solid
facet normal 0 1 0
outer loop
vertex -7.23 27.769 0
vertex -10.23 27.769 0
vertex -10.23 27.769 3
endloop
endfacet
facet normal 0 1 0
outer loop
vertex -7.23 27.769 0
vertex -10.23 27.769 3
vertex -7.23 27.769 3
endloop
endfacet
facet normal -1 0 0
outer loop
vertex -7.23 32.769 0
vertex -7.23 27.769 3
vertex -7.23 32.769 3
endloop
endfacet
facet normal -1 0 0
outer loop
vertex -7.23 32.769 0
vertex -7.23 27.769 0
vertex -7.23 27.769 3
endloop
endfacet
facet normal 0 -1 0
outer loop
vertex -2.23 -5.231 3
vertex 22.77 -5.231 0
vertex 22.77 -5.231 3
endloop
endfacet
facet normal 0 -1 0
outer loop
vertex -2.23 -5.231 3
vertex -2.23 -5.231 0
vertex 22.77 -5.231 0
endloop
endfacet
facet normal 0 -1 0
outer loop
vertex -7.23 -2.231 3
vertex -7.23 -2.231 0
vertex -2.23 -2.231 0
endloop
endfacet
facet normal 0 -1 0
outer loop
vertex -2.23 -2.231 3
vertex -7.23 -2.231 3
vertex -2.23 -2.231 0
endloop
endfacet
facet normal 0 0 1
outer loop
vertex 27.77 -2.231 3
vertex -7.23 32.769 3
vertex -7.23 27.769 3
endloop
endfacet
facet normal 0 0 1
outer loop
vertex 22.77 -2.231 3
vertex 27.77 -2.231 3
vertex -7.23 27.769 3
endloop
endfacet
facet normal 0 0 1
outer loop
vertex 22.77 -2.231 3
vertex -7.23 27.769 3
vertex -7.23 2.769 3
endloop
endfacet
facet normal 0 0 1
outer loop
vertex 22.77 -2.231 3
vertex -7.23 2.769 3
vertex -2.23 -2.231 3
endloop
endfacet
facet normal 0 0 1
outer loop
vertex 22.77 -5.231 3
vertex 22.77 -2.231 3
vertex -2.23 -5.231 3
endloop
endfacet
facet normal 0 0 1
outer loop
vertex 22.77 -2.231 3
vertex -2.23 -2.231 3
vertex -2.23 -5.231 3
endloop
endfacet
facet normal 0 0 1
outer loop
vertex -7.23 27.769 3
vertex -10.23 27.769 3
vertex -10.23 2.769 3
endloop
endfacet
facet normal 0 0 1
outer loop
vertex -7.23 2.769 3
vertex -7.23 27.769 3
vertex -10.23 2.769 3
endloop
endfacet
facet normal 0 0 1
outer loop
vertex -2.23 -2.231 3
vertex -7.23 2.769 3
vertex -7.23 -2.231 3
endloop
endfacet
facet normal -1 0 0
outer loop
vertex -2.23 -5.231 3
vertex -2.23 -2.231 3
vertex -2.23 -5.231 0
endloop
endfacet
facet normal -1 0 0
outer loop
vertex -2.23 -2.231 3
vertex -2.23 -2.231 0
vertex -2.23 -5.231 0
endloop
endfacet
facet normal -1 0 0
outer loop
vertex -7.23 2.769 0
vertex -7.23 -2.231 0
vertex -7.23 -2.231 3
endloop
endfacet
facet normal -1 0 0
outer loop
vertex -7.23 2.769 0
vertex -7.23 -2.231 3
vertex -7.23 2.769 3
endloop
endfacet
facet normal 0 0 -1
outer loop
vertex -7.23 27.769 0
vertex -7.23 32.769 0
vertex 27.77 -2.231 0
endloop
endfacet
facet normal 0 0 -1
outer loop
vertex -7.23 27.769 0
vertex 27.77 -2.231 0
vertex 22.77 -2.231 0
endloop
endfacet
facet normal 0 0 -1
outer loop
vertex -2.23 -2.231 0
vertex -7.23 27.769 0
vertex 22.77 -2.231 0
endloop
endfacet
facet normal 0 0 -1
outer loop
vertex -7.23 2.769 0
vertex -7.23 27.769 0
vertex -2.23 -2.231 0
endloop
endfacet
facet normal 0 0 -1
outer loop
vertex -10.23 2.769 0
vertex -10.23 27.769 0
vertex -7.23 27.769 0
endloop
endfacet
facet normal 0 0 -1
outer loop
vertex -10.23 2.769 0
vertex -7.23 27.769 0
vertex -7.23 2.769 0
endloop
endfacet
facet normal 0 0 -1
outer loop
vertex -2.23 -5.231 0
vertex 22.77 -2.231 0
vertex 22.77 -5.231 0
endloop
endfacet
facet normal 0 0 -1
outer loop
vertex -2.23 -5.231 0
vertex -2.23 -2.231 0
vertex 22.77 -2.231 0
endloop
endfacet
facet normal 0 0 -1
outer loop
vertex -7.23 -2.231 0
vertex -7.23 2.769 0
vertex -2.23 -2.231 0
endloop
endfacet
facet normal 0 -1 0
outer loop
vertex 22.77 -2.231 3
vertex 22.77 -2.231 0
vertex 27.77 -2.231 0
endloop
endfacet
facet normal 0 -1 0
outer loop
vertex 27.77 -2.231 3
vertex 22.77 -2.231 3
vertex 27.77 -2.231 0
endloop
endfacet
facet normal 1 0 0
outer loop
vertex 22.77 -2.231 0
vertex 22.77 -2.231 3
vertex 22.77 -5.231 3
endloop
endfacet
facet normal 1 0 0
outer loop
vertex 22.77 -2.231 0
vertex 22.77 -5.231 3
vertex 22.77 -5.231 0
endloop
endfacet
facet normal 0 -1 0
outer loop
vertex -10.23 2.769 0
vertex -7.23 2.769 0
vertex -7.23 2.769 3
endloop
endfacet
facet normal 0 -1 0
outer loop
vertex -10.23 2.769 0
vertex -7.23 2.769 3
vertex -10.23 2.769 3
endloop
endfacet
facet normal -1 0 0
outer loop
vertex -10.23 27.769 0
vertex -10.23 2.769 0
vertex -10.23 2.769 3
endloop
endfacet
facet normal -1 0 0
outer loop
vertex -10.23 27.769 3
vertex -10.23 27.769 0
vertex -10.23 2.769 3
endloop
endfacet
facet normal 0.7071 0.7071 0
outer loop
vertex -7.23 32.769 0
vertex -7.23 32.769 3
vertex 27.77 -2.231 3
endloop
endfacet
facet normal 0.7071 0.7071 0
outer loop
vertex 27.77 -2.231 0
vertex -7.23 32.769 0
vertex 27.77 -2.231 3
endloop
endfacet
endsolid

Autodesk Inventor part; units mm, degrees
ref_plane "YZ Plane" through (0, 0, 0) normal (1, 0, 0) x (0, 1, 0)
ref_plane "XZ Plane" through (0, 0, 0) normal (0, 1, 0) x (-1, 0, 0)
ref_plane "XY Plane" through (0, 0, 0) normal (0, 0, 1) x (1, 0, 0)
sketch "Sketch1" plane through (0, 0, 0) normal (0, 0, 1) x (1, 0, 0)
  line L0 (-7.2302, -2.2309) -> (-2.2302, -2.2309)
  line L1 (-2.2302, -2.2309) -> (-2.2302, -5.2309)
  line L2 (-2.2302, -5.2309) -> (7.7698, -5.2309)
  line L3 (7.7698, -5.2309) -> (7.7698, -2.2309)
  line L4 (7.7698, -2.2309) -> (12.7698, -2.2309)
  line L5 (-7.2302, -2.2309) -> (-7.2302, 2.7691)
  line L6 (-7.2302, 2.7691) -> (-10.2302, 2.7691)
  line L7 (-10.2302, 2.7691) -> (-10.2302, 12.7691)
  line L8 (-10.2302, 12.7691) -> (-7.2302, 12.7691)
  line L9 (-7.2302, 12.7691) -> (-7.2302, 17.7691)
  line L10 (-7.2302, 17.7691) -> (12.7698, -2.2309)
  point P0 (0, 0)
  dimension "d2" = 5
  dimension "d3" = 5
  dimension "d4" = 10
  dimension "d5" = 5
  dimension "d6" = 10
  dimension "d7" = 5
extrude "Extrusion1" add sketch "Sketch1" along normal blind 3
sketch "Sketch2" plane through (0, 0, 3) normal (0, 0, 1) x (1, 0, 0)
  line L0 (-7.2302, 17.7691) -> (-7.2302, 12.7691) projected
  line L1 (-7.2302, 17.7691) -> (-7.2302, 32.7691)
  line L2 (12.7698, -2.2309) -> (-7.2302, 17.7691) projected
  line L3 (12.7698, -2.2309) -> (27.7698, -2.2309)
  line L4 (-7.2302, 32.7691) -> (27.7698, -2.2309)
  line L5 (-7.2302, 17.7691) -> (12.7698, -2.2309)
  point P0 (0, 0)
  dimension "d14" = 15
  dimension "d15" = 15
extrude "Extrusion2" add sketch "Sketch2" against normal blind 3
sketch "Sketch3" plane through (-10.2302, 12.7691, 0) normal (0, 1, 0) x (1, 0, 0)
  line L0 (0, 0) -> (0, -3) projected
  line L1 (3, 0) -> (3, -3) projected
  line L2 (0, 0) -> (3, 0)
  line L3 (3, 0) -> (3, -3)
  line L4 (3, -3) -> (0, -3)
  line L5 (0, -3) -> (0, 0)
  point P0 (10.2302, 0)
extrude "Extrusion3" add sketch "Sketch3" along normal blind 15
sketch "Sketch4" plane through (7.7698, -5.2309, 0) normal (1, 0, 0) x (0, 0, -1)
  line L0 (-3, 3) -> (-3, 0) projected
  line L1 (-3, 3) -> (0, 3)
  line L2 (0, 3) -> (0, 0)
  line L3 (0, 0) -> (-3, 0)
  line L4 (-3, 0) -> (-3, 3)
  point P0 (0, 5.2309)
extrude "Extrusion4" add sketch "Sketch4" along normal blind 15
properties part number "Support Piece"
